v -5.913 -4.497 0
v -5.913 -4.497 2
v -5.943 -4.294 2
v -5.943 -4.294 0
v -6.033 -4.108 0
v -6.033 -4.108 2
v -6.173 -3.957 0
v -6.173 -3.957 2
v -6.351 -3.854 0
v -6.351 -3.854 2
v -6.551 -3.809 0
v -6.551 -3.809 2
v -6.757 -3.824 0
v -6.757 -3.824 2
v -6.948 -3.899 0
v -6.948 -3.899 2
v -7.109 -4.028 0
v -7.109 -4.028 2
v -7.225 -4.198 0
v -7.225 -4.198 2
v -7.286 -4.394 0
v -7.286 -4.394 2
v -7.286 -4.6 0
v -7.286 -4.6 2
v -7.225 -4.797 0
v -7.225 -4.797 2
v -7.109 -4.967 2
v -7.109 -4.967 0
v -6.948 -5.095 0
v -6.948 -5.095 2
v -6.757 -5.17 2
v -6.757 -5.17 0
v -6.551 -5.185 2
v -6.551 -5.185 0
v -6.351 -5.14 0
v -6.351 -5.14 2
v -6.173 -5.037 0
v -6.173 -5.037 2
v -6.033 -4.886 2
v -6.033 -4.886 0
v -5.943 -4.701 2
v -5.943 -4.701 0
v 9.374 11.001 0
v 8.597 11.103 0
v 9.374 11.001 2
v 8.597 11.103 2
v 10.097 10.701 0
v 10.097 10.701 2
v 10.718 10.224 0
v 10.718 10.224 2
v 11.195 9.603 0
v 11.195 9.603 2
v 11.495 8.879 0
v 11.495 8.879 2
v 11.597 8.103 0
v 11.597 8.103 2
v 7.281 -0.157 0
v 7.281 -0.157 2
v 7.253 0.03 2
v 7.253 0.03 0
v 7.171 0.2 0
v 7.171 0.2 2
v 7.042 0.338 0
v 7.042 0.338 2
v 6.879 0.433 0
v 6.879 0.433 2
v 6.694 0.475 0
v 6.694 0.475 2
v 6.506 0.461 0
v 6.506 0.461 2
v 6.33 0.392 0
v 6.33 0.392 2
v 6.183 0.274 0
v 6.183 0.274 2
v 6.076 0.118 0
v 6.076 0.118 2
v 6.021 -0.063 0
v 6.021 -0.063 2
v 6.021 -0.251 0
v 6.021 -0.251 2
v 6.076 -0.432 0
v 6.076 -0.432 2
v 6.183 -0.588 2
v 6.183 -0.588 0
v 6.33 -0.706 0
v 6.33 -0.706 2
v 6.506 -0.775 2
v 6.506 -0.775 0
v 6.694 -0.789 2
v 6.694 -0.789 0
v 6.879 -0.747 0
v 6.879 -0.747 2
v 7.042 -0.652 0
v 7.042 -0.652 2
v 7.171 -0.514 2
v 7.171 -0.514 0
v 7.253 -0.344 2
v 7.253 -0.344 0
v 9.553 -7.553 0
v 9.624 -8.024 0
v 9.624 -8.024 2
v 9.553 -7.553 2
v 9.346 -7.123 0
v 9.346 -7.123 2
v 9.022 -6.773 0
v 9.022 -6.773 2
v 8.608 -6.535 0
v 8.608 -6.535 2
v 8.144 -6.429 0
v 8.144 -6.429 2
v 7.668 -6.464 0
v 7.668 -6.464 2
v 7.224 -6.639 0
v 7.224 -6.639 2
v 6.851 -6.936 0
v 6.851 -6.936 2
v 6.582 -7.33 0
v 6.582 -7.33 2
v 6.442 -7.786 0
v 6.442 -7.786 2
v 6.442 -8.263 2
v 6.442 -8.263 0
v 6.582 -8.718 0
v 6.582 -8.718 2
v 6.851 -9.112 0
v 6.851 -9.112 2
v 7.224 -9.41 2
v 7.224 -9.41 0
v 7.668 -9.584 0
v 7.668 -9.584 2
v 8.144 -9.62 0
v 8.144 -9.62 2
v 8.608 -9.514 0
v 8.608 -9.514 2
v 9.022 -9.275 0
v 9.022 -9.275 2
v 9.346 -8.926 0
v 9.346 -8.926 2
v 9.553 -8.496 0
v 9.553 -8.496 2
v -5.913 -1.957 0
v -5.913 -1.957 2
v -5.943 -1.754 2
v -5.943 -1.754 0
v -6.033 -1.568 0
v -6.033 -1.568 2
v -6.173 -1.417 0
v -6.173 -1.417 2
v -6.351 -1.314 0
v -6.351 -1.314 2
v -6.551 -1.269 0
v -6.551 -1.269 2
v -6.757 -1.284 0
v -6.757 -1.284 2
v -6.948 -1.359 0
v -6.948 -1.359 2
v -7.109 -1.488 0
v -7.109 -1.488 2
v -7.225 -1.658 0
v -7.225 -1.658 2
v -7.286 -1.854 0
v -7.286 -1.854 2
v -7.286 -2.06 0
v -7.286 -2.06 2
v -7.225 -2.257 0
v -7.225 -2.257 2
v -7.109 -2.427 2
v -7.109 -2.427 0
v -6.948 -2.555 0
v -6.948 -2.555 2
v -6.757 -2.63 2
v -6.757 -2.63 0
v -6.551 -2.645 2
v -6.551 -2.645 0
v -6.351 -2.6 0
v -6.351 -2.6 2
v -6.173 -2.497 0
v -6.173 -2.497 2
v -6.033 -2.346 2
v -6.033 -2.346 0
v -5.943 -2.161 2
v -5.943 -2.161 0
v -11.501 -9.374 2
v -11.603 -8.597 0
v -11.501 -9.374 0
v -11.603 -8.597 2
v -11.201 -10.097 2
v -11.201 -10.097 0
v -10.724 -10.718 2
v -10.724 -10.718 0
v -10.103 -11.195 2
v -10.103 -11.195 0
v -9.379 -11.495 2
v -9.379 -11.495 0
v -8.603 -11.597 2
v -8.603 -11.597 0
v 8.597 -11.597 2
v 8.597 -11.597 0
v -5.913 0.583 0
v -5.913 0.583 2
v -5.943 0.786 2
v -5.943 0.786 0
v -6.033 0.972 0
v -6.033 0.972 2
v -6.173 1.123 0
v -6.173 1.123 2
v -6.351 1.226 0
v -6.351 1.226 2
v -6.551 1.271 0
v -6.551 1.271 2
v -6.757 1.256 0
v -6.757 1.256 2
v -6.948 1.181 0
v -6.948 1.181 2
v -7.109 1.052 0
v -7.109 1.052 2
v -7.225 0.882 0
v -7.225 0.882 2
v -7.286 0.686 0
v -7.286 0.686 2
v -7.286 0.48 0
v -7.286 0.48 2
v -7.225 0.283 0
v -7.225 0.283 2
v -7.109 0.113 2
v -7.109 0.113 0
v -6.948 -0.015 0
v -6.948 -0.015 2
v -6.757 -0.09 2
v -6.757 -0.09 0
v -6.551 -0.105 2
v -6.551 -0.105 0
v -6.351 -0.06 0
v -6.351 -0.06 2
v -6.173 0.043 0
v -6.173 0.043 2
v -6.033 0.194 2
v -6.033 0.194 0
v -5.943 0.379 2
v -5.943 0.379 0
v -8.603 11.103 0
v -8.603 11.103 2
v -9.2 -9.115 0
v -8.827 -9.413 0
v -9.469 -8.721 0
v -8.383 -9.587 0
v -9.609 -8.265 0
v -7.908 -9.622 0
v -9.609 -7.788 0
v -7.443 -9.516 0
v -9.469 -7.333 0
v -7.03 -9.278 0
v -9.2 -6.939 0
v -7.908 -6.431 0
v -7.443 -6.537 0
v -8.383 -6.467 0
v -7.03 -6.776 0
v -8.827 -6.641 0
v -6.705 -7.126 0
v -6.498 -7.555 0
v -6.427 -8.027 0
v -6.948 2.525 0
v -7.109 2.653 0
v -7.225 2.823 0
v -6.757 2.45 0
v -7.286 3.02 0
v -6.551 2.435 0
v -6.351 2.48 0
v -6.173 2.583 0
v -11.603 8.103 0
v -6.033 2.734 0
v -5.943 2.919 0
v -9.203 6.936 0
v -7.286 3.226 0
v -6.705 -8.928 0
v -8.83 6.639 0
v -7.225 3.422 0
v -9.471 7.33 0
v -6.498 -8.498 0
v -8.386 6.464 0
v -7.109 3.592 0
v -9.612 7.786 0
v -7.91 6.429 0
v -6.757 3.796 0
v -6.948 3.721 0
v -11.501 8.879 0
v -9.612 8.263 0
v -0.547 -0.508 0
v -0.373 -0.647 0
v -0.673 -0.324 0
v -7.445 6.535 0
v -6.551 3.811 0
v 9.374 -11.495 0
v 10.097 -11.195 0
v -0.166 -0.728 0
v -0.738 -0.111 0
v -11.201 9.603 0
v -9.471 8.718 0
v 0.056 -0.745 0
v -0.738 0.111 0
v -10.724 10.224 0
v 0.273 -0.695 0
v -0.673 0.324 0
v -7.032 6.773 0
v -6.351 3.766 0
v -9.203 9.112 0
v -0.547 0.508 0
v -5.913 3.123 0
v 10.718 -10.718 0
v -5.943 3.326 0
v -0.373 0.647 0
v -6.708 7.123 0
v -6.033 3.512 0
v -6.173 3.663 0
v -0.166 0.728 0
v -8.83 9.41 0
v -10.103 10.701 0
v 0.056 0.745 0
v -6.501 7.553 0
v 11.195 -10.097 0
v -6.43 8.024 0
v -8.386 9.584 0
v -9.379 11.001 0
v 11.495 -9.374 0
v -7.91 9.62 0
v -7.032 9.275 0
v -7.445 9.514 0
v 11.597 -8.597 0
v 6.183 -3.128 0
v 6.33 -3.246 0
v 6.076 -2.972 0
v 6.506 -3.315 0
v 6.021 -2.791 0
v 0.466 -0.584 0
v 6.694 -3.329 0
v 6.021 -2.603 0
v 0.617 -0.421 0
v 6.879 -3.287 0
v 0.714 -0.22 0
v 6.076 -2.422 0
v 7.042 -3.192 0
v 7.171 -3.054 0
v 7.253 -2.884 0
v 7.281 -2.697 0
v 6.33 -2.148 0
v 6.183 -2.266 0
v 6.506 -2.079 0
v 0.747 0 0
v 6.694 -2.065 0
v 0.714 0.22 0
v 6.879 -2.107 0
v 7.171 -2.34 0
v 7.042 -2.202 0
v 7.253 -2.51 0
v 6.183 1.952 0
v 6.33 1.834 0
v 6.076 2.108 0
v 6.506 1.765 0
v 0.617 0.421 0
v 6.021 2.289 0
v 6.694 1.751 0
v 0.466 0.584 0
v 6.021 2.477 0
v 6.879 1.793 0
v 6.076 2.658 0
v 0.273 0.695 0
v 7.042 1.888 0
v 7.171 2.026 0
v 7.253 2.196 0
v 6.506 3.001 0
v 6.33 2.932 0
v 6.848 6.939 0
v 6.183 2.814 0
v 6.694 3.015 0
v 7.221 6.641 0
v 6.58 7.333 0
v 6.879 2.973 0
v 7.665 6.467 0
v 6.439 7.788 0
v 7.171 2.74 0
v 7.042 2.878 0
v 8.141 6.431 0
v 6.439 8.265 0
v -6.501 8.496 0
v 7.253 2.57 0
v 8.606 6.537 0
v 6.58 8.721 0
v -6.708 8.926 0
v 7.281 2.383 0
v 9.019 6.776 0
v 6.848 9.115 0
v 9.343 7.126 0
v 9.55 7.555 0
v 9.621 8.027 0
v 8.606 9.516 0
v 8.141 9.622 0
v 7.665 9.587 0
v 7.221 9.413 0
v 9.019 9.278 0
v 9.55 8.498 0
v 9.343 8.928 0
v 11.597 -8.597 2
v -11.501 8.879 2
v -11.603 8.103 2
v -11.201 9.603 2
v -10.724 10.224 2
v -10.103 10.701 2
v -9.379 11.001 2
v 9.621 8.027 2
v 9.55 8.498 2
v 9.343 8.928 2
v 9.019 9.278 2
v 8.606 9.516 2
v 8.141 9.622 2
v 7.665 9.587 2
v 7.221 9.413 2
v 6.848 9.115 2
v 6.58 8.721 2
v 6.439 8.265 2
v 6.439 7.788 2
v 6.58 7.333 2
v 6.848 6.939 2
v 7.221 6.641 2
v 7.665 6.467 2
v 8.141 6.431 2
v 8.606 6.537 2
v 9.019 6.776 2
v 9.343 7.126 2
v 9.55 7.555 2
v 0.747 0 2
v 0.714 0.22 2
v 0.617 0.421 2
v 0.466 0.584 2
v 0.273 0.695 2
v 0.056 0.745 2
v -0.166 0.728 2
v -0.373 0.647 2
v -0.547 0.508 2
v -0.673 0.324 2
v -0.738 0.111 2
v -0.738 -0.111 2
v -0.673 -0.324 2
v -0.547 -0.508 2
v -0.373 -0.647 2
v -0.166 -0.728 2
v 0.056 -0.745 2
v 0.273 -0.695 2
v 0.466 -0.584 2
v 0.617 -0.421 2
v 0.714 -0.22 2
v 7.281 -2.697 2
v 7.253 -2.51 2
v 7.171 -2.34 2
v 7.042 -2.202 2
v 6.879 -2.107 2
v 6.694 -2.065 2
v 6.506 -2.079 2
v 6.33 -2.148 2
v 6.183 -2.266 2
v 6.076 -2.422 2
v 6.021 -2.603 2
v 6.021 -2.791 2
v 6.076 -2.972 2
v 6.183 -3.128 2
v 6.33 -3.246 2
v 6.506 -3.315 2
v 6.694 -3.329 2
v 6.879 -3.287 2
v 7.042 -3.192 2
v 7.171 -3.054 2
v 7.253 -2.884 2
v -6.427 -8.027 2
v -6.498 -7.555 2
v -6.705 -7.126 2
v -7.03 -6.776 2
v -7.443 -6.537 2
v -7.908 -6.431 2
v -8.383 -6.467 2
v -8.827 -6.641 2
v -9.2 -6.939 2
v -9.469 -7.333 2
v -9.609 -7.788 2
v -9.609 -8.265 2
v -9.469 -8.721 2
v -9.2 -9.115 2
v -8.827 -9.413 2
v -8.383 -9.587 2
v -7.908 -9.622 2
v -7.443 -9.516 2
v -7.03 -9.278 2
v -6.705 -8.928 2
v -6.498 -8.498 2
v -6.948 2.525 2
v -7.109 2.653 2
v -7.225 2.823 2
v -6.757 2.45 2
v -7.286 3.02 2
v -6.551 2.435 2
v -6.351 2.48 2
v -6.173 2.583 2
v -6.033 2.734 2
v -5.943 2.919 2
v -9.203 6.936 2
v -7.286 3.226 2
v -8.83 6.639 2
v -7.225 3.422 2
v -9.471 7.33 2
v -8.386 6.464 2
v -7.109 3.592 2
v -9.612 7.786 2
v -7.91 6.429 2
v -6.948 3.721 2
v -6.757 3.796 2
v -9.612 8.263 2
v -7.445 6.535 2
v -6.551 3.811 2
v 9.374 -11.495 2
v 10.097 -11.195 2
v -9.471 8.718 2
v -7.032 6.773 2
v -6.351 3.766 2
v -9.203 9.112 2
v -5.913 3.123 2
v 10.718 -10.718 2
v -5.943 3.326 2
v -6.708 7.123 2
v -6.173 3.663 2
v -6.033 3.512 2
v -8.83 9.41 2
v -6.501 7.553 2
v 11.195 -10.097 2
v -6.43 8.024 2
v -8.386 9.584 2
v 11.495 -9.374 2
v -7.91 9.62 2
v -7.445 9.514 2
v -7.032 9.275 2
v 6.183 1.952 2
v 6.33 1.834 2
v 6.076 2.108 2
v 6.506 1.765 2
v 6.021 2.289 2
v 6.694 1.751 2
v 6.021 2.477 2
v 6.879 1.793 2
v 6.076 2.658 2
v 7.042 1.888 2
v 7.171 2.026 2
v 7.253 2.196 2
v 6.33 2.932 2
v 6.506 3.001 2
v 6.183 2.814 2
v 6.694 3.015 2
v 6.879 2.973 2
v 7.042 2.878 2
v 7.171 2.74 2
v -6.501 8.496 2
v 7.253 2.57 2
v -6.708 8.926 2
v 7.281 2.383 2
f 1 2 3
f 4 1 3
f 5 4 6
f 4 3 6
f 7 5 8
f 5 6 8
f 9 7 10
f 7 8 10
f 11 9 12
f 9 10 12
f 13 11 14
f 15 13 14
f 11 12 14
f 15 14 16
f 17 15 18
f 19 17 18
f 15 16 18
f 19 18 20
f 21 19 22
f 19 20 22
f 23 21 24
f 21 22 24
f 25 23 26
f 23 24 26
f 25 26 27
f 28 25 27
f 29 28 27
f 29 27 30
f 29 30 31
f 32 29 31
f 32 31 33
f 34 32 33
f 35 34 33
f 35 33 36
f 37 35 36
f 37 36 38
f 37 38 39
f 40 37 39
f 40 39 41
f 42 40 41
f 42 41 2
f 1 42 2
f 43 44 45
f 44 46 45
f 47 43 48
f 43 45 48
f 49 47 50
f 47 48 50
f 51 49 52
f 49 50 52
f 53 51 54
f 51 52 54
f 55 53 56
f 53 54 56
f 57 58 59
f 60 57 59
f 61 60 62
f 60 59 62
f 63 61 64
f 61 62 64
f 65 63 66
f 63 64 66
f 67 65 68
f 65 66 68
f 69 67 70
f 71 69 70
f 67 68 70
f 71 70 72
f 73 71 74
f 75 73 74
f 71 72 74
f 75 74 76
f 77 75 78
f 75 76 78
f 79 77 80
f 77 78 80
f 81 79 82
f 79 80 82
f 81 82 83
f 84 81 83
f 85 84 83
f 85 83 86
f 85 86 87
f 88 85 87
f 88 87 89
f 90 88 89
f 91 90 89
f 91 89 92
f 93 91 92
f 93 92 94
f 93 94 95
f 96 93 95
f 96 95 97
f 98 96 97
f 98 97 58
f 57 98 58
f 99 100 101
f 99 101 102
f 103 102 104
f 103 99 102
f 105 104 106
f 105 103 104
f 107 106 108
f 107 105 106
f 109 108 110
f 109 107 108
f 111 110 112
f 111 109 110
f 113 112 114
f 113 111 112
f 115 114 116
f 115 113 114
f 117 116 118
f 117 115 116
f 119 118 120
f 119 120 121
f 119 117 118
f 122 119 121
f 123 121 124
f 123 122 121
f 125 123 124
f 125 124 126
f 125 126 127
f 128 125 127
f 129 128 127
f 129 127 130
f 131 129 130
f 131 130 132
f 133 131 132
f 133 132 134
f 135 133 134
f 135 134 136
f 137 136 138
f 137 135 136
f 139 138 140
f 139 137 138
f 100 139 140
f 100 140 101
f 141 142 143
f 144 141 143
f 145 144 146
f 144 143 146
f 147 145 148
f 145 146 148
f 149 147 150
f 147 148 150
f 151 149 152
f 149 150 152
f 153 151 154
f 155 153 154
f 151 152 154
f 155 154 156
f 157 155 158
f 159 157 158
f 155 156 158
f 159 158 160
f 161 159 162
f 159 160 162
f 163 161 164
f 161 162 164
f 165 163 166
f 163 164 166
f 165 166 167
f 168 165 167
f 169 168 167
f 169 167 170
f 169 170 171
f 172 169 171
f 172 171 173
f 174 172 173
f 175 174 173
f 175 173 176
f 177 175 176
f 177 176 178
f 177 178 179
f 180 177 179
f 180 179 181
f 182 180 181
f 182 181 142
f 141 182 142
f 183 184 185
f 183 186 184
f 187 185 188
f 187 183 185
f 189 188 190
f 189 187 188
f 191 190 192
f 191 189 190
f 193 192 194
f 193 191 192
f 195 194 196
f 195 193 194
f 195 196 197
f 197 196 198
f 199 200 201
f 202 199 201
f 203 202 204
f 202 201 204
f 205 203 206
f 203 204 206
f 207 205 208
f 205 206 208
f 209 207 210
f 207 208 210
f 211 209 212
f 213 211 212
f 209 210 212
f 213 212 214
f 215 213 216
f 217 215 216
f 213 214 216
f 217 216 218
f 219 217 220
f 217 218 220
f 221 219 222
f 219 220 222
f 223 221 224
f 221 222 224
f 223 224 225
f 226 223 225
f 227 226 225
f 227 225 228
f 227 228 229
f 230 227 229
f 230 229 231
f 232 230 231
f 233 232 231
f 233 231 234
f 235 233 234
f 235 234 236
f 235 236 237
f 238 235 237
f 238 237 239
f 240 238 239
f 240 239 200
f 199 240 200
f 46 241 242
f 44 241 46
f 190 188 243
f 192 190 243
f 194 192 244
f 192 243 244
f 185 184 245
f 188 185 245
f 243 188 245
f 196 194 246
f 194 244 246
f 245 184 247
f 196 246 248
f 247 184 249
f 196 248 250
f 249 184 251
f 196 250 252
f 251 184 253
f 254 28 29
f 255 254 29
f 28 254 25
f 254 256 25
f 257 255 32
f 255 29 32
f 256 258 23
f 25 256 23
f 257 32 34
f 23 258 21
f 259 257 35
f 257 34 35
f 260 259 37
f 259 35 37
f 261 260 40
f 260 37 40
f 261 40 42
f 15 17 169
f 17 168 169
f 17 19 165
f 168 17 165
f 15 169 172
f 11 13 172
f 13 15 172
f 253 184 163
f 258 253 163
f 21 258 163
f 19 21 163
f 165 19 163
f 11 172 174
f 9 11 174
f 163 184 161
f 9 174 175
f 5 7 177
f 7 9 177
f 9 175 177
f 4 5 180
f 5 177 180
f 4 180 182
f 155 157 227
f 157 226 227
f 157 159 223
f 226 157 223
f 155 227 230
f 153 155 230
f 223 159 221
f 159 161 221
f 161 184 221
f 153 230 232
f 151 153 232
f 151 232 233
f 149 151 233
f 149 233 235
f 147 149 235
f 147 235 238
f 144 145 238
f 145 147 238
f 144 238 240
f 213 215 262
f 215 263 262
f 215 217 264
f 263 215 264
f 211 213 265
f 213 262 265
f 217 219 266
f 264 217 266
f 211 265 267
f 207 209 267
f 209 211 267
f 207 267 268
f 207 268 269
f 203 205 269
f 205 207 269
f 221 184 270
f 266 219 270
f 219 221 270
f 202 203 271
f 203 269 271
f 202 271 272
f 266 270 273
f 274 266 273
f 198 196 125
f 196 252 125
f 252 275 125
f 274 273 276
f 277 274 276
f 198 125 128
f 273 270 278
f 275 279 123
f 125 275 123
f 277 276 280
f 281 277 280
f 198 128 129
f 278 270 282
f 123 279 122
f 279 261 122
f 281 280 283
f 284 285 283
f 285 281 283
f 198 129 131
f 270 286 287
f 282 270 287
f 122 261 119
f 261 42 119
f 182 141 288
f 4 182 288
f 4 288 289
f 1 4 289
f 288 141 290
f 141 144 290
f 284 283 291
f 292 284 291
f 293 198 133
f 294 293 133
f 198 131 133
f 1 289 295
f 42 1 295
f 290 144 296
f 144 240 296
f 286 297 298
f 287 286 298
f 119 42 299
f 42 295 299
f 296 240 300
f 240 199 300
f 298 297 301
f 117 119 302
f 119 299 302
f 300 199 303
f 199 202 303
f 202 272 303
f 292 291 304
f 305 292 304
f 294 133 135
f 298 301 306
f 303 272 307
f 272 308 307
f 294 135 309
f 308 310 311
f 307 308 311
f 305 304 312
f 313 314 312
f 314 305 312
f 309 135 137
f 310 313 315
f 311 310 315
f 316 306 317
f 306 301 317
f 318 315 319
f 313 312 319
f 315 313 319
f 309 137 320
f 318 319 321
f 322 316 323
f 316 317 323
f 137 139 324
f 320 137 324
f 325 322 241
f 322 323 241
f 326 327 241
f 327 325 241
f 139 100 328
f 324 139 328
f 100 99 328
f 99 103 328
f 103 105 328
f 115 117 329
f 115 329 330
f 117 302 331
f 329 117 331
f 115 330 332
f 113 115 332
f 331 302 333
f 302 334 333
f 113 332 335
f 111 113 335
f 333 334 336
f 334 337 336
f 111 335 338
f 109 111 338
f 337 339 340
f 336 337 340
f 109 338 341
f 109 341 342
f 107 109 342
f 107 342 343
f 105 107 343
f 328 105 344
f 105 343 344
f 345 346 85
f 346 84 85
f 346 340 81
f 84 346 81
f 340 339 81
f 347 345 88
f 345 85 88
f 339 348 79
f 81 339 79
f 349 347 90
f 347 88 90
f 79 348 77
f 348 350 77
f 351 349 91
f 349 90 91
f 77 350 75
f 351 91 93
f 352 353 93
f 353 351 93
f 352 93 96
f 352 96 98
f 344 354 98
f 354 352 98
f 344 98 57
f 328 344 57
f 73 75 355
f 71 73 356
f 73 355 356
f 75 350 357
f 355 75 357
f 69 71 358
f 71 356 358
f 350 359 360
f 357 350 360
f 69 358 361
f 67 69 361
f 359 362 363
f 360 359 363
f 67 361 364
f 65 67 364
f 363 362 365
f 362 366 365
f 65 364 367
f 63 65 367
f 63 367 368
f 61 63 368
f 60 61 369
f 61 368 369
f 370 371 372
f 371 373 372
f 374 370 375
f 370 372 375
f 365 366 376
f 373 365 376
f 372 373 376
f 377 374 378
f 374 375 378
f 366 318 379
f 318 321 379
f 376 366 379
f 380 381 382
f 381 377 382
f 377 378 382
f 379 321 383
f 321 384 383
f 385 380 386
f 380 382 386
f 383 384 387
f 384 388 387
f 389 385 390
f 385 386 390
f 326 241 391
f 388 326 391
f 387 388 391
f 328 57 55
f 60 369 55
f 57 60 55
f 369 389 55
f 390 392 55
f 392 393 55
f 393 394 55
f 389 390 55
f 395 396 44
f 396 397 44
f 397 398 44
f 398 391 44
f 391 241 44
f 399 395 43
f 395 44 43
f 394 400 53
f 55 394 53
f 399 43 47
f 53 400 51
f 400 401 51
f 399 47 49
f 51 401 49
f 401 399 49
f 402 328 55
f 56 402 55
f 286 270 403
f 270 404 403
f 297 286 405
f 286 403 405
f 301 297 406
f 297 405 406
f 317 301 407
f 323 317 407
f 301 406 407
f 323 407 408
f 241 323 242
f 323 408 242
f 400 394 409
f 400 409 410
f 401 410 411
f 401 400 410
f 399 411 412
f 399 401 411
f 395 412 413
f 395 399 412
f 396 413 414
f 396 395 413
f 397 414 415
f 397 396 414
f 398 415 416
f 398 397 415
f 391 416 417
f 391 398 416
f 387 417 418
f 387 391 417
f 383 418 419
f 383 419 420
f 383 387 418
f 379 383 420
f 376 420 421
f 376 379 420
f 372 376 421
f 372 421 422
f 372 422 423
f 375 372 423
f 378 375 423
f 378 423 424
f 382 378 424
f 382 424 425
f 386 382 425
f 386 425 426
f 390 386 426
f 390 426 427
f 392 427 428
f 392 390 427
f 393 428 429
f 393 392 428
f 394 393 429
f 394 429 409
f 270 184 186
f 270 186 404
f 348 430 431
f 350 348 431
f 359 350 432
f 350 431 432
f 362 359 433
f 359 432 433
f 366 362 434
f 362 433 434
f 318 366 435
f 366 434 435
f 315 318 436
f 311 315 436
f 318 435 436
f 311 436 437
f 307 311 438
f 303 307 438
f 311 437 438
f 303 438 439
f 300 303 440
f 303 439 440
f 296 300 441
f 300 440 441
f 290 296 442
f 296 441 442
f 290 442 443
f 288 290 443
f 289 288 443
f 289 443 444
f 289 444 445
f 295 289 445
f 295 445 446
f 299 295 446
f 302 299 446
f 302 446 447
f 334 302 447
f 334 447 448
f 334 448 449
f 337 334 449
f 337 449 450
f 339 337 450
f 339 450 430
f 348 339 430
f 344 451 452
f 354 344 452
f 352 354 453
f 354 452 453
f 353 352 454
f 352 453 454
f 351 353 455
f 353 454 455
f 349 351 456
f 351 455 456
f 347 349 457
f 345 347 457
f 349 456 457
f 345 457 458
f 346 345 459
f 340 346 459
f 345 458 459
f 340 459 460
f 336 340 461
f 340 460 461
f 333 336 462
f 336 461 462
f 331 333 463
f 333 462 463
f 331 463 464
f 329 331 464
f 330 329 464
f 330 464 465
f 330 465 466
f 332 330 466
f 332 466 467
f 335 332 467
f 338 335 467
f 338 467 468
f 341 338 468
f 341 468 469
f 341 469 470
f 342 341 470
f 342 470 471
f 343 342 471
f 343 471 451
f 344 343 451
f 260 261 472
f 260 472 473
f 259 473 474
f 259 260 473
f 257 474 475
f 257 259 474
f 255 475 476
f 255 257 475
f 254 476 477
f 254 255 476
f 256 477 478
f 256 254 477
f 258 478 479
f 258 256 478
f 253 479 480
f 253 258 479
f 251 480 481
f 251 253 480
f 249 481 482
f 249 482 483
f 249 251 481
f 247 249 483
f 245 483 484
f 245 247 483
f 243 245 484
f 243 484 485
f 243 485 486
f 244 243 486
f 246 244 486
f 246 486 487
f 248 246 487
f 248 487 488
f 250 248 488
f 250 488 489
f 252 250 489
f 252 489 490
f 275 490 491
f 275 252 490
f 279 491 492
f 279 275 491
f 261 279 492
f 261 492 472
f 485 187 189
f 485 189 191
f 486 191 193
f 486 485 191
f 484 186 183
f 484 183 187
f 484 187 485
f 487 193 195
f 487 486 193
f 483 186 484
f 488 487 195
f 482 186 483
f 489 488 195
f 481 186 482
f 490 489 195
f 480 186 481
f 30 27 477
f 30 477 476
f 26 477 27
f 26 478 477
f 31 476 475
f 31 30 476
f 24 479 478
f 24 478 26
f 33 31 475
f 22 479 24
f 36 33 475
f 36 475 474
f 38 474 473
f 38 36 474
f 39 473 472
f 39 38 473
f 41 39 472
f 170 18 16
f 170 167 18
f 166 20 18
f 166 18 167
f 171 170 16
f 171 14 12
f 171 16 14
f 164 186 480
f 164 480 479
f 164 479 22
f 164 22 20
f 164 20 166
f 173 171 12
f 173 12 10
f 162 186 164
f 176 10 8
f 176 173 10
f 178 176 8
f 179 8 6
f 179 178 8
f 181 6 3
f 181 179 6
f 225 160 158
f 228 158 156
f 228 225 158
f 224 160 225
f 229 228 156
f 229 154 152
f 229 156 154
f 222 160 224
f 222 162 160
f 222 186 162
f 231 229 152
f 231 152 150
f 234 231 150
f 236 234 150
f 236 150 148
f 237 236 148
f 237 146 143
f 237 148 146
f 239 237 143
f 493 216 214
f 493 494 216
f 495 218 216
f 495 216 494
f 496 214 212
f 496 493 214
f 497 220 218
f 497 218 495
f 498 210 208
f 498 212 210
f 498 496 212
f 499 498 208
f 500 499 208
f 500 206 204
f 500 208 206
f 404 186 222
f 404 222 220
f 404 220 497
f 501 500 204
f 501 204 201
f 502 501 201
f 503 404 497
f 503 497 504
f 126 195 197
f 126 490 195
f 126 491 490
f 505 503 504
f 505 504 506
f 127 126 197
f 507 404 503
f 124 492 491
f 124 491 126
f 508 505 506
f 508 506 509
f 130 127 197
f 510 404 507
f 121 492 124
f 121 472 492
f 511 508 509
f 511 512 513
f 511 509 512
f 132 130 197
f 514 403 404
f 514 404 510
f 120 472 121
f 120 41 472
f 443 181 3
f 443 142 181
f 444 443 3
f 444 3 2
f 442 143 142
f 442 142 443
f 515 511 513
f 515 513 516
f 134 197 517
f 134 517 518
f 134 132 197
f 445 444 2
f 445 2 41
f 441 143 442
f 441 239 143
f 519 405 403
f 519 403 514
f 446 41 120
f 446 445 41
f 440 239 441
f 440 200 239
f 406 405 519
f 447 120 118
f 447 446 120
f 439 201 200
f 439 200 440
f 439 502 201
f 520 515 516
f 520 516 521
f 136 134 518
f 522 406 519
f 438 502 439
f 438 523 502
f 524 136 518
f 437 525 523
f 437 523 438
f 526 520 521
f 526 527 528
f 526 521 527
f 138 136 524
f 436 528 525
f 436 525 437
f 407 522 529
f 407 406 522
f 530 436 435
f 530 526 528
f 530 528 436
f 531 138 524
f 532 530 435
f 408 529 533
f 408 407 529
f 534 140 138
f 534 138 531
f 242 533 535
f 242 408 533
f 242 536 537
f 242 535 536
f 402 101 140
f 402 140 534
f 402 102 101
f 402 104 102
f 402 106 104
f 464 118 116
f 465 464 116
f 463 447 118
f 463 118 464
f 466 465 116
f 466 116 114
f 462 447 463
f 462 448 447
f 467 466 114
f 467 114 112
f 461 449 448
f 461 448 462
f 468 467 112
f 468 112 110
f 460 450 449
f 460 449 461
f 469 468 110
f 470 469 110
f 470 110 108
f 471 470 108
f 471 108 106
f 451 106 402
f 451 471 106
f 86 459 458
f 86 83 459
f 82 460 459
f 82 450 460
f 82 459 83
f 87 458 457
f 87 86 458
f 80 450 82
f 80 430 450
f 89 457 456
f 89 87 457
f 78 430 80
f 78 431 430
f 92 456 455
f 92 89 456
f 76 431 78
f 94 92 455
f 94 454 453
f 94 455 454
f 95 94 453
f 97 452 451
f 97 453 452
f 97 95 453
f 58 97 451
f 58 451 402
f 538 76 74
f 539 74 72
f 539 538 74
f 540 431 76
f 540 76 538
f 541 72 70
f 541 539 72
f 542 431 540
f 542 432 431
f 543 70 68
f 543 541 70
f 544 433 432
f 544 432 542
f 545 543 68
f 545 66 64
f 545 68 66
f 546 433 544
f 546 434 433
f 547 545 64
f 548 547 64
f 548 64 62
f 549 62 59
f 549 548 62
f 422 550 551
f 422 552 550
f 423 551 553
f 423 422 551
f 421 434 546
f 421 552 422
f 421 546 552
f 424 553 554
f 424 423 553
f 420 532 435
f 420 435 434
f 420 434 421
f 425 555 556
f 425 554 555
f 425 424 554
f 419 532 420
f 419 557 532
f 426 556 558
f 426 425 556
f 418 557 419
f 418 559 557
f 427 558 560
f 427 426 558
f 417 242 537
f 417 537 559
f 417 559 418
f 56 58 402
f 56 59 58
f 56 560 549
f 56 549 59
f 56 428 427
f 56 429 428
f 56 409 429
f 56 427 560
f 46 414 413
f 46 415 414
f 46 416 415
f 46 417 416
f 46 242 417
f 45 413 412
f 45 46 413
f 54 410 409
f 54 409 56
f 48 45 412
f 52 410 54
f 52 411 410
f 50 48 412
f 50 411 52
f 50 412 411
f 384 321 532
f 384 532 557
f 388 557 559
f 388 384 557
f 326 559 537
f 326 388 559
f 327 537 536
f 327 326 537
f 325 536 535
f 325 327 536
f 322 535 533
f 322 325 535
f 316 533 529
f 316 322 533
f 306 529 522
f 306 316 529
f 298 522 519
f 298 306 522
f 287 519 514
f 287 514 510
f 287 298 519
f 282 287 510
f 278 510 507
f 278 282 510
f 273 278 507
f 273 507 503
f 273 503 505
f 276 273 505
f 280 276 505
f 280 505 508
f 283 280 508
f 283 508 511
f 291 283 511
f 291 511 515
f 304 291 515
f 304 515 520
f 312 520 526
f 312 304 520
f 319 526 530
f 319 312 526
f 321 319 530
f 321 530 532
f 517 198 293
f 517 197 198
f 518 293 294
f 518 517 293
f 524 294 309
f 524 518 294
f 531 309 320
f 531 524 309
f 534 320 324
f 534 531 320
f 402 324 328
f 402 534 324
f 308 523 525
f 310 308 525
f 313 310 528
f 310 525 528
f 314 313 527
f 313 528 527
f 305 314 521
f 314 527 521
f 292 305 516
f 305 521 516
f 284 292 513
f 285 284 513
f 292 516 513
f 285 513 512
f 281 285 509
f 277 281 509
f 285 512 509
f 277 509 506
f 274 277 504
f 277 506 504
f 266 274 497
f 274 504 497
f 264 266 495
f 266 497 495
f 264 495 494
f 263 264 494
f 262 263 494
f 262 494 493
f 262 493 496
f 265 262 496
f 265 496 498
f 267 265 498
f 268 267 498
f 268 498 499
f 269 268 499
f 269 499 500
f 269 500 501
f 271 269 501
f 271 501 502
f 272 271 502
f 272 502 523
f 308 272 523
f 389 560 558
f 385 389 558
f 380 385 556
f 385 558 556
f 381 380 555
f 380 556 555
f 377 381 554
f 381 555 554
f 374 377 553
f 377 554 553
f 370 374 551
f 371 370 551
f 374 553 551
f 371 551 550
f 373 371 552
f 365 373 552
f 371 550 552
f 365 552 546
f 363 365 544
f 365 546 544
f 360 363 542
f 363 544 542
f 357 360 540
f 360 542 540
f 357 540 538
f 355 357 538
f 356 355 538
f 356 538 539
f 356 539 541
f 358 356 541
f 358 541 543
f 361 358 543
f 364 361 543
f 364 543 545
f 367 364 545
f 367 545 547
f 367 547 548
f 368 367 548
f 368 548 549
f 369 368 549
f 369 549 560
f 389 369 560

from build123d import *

# Parameters (mm, degrees)
SKETCH1_W           = 23.2
SKETCH1_H           = 22.7
SKETCH1_R           = 1.6
BOSS_EXTRUDE1_DEPTH = 2
FILLET1_R           = 3
SKETCH2_R           = 0.633596253
SKETCH2_R_2         = 0.690319611
CUT_EXTRUDE1_DEPTH  = 3
SKETCH3_R           = 0.746836088
CUT_EXTRUDE2_DEPTH  = 3


with BuildPart() as part:
    # Sketch1 → Boss-Extrude1 (new body)
    with BuildSketch(Plane.XY):
        with Locations((-0.002931945, -0.247067135)):
            Rectangle(SKETCH1_W, SKETCH1_H)
        with Locations((-8.029814258, 8.024213837)):
            Circle(SKETCH1_R, mode=Mode.SUBTRACT)
        with Locations((8.021282811, 8.026881394)):
            Circle(SKETCH1_R, mode=Mode.SUBTRACT)
        with Locations((8.023950367, -8.024215675)):
            Circle(SKETCH1_R, mode=Mode.SUBTRACT)
        with Locations((-8.027146702, -8.026883232)):
            Circle(SKETCH1_R, mode=Mode.SUBTRACT)
    extrude(amount=BOSS_EXTRUDE1_DEPTH)

    # Fillet1
    fillet1_edges = [part.edges().sort_by_distance(p)[0] for p in [
        (11.597068055, -11.597067135, 1),
        (-11.602931945, -11.597067135, 1),
        (-11.602931945, 11.102932865, 1),
        (11.597068055, 11.102932865, 1),
    ]]
    fillet(fillet1_edges, radius=FILLET1_R)

    # Sketch2 → Cut-Extrude1 (cut, through all)
    with BuildSketch(Plane.XY.offset(2)):
        with Locations((6.647068055, -2.697067135)):
            Circle(SKETCH2_R)
        with Locations((6.647068055, -0.157067135)):
            Circle(SKETCH2_R)
        with Locations((6.647068055, 2.382932865)):
            Circle(SKETCH2_R)
        with Locations((-6.602931945, -4.497067135)):
            Circle(SKETCH2_R_2)
        with Locations((-6.602931945, -1.957067135)):
            Circle(SKETCH2_R_2)
        with Locations((-6.602931945, 0.582932865)):
            Circle(SKETCH2_R_2)
        with Locations((-6.602931945, 3.122932865)):
            Circle(SKETCH2_R_2)
    extrude(amount=-CUT_EXTRUDE1_DEPTH, mode=Mode.SUBTRACT)

    # Sketch3 → Cut-Extrude2 (cut, through all)
    with BuildSketch(Plane.XY.offset(2)):
        Circle(SKETCH3_R)
    extrude(amount=-CUT_EXTRUDE2_DEPTH, mode=Mode.SUBTRACT)


solid = part.part
